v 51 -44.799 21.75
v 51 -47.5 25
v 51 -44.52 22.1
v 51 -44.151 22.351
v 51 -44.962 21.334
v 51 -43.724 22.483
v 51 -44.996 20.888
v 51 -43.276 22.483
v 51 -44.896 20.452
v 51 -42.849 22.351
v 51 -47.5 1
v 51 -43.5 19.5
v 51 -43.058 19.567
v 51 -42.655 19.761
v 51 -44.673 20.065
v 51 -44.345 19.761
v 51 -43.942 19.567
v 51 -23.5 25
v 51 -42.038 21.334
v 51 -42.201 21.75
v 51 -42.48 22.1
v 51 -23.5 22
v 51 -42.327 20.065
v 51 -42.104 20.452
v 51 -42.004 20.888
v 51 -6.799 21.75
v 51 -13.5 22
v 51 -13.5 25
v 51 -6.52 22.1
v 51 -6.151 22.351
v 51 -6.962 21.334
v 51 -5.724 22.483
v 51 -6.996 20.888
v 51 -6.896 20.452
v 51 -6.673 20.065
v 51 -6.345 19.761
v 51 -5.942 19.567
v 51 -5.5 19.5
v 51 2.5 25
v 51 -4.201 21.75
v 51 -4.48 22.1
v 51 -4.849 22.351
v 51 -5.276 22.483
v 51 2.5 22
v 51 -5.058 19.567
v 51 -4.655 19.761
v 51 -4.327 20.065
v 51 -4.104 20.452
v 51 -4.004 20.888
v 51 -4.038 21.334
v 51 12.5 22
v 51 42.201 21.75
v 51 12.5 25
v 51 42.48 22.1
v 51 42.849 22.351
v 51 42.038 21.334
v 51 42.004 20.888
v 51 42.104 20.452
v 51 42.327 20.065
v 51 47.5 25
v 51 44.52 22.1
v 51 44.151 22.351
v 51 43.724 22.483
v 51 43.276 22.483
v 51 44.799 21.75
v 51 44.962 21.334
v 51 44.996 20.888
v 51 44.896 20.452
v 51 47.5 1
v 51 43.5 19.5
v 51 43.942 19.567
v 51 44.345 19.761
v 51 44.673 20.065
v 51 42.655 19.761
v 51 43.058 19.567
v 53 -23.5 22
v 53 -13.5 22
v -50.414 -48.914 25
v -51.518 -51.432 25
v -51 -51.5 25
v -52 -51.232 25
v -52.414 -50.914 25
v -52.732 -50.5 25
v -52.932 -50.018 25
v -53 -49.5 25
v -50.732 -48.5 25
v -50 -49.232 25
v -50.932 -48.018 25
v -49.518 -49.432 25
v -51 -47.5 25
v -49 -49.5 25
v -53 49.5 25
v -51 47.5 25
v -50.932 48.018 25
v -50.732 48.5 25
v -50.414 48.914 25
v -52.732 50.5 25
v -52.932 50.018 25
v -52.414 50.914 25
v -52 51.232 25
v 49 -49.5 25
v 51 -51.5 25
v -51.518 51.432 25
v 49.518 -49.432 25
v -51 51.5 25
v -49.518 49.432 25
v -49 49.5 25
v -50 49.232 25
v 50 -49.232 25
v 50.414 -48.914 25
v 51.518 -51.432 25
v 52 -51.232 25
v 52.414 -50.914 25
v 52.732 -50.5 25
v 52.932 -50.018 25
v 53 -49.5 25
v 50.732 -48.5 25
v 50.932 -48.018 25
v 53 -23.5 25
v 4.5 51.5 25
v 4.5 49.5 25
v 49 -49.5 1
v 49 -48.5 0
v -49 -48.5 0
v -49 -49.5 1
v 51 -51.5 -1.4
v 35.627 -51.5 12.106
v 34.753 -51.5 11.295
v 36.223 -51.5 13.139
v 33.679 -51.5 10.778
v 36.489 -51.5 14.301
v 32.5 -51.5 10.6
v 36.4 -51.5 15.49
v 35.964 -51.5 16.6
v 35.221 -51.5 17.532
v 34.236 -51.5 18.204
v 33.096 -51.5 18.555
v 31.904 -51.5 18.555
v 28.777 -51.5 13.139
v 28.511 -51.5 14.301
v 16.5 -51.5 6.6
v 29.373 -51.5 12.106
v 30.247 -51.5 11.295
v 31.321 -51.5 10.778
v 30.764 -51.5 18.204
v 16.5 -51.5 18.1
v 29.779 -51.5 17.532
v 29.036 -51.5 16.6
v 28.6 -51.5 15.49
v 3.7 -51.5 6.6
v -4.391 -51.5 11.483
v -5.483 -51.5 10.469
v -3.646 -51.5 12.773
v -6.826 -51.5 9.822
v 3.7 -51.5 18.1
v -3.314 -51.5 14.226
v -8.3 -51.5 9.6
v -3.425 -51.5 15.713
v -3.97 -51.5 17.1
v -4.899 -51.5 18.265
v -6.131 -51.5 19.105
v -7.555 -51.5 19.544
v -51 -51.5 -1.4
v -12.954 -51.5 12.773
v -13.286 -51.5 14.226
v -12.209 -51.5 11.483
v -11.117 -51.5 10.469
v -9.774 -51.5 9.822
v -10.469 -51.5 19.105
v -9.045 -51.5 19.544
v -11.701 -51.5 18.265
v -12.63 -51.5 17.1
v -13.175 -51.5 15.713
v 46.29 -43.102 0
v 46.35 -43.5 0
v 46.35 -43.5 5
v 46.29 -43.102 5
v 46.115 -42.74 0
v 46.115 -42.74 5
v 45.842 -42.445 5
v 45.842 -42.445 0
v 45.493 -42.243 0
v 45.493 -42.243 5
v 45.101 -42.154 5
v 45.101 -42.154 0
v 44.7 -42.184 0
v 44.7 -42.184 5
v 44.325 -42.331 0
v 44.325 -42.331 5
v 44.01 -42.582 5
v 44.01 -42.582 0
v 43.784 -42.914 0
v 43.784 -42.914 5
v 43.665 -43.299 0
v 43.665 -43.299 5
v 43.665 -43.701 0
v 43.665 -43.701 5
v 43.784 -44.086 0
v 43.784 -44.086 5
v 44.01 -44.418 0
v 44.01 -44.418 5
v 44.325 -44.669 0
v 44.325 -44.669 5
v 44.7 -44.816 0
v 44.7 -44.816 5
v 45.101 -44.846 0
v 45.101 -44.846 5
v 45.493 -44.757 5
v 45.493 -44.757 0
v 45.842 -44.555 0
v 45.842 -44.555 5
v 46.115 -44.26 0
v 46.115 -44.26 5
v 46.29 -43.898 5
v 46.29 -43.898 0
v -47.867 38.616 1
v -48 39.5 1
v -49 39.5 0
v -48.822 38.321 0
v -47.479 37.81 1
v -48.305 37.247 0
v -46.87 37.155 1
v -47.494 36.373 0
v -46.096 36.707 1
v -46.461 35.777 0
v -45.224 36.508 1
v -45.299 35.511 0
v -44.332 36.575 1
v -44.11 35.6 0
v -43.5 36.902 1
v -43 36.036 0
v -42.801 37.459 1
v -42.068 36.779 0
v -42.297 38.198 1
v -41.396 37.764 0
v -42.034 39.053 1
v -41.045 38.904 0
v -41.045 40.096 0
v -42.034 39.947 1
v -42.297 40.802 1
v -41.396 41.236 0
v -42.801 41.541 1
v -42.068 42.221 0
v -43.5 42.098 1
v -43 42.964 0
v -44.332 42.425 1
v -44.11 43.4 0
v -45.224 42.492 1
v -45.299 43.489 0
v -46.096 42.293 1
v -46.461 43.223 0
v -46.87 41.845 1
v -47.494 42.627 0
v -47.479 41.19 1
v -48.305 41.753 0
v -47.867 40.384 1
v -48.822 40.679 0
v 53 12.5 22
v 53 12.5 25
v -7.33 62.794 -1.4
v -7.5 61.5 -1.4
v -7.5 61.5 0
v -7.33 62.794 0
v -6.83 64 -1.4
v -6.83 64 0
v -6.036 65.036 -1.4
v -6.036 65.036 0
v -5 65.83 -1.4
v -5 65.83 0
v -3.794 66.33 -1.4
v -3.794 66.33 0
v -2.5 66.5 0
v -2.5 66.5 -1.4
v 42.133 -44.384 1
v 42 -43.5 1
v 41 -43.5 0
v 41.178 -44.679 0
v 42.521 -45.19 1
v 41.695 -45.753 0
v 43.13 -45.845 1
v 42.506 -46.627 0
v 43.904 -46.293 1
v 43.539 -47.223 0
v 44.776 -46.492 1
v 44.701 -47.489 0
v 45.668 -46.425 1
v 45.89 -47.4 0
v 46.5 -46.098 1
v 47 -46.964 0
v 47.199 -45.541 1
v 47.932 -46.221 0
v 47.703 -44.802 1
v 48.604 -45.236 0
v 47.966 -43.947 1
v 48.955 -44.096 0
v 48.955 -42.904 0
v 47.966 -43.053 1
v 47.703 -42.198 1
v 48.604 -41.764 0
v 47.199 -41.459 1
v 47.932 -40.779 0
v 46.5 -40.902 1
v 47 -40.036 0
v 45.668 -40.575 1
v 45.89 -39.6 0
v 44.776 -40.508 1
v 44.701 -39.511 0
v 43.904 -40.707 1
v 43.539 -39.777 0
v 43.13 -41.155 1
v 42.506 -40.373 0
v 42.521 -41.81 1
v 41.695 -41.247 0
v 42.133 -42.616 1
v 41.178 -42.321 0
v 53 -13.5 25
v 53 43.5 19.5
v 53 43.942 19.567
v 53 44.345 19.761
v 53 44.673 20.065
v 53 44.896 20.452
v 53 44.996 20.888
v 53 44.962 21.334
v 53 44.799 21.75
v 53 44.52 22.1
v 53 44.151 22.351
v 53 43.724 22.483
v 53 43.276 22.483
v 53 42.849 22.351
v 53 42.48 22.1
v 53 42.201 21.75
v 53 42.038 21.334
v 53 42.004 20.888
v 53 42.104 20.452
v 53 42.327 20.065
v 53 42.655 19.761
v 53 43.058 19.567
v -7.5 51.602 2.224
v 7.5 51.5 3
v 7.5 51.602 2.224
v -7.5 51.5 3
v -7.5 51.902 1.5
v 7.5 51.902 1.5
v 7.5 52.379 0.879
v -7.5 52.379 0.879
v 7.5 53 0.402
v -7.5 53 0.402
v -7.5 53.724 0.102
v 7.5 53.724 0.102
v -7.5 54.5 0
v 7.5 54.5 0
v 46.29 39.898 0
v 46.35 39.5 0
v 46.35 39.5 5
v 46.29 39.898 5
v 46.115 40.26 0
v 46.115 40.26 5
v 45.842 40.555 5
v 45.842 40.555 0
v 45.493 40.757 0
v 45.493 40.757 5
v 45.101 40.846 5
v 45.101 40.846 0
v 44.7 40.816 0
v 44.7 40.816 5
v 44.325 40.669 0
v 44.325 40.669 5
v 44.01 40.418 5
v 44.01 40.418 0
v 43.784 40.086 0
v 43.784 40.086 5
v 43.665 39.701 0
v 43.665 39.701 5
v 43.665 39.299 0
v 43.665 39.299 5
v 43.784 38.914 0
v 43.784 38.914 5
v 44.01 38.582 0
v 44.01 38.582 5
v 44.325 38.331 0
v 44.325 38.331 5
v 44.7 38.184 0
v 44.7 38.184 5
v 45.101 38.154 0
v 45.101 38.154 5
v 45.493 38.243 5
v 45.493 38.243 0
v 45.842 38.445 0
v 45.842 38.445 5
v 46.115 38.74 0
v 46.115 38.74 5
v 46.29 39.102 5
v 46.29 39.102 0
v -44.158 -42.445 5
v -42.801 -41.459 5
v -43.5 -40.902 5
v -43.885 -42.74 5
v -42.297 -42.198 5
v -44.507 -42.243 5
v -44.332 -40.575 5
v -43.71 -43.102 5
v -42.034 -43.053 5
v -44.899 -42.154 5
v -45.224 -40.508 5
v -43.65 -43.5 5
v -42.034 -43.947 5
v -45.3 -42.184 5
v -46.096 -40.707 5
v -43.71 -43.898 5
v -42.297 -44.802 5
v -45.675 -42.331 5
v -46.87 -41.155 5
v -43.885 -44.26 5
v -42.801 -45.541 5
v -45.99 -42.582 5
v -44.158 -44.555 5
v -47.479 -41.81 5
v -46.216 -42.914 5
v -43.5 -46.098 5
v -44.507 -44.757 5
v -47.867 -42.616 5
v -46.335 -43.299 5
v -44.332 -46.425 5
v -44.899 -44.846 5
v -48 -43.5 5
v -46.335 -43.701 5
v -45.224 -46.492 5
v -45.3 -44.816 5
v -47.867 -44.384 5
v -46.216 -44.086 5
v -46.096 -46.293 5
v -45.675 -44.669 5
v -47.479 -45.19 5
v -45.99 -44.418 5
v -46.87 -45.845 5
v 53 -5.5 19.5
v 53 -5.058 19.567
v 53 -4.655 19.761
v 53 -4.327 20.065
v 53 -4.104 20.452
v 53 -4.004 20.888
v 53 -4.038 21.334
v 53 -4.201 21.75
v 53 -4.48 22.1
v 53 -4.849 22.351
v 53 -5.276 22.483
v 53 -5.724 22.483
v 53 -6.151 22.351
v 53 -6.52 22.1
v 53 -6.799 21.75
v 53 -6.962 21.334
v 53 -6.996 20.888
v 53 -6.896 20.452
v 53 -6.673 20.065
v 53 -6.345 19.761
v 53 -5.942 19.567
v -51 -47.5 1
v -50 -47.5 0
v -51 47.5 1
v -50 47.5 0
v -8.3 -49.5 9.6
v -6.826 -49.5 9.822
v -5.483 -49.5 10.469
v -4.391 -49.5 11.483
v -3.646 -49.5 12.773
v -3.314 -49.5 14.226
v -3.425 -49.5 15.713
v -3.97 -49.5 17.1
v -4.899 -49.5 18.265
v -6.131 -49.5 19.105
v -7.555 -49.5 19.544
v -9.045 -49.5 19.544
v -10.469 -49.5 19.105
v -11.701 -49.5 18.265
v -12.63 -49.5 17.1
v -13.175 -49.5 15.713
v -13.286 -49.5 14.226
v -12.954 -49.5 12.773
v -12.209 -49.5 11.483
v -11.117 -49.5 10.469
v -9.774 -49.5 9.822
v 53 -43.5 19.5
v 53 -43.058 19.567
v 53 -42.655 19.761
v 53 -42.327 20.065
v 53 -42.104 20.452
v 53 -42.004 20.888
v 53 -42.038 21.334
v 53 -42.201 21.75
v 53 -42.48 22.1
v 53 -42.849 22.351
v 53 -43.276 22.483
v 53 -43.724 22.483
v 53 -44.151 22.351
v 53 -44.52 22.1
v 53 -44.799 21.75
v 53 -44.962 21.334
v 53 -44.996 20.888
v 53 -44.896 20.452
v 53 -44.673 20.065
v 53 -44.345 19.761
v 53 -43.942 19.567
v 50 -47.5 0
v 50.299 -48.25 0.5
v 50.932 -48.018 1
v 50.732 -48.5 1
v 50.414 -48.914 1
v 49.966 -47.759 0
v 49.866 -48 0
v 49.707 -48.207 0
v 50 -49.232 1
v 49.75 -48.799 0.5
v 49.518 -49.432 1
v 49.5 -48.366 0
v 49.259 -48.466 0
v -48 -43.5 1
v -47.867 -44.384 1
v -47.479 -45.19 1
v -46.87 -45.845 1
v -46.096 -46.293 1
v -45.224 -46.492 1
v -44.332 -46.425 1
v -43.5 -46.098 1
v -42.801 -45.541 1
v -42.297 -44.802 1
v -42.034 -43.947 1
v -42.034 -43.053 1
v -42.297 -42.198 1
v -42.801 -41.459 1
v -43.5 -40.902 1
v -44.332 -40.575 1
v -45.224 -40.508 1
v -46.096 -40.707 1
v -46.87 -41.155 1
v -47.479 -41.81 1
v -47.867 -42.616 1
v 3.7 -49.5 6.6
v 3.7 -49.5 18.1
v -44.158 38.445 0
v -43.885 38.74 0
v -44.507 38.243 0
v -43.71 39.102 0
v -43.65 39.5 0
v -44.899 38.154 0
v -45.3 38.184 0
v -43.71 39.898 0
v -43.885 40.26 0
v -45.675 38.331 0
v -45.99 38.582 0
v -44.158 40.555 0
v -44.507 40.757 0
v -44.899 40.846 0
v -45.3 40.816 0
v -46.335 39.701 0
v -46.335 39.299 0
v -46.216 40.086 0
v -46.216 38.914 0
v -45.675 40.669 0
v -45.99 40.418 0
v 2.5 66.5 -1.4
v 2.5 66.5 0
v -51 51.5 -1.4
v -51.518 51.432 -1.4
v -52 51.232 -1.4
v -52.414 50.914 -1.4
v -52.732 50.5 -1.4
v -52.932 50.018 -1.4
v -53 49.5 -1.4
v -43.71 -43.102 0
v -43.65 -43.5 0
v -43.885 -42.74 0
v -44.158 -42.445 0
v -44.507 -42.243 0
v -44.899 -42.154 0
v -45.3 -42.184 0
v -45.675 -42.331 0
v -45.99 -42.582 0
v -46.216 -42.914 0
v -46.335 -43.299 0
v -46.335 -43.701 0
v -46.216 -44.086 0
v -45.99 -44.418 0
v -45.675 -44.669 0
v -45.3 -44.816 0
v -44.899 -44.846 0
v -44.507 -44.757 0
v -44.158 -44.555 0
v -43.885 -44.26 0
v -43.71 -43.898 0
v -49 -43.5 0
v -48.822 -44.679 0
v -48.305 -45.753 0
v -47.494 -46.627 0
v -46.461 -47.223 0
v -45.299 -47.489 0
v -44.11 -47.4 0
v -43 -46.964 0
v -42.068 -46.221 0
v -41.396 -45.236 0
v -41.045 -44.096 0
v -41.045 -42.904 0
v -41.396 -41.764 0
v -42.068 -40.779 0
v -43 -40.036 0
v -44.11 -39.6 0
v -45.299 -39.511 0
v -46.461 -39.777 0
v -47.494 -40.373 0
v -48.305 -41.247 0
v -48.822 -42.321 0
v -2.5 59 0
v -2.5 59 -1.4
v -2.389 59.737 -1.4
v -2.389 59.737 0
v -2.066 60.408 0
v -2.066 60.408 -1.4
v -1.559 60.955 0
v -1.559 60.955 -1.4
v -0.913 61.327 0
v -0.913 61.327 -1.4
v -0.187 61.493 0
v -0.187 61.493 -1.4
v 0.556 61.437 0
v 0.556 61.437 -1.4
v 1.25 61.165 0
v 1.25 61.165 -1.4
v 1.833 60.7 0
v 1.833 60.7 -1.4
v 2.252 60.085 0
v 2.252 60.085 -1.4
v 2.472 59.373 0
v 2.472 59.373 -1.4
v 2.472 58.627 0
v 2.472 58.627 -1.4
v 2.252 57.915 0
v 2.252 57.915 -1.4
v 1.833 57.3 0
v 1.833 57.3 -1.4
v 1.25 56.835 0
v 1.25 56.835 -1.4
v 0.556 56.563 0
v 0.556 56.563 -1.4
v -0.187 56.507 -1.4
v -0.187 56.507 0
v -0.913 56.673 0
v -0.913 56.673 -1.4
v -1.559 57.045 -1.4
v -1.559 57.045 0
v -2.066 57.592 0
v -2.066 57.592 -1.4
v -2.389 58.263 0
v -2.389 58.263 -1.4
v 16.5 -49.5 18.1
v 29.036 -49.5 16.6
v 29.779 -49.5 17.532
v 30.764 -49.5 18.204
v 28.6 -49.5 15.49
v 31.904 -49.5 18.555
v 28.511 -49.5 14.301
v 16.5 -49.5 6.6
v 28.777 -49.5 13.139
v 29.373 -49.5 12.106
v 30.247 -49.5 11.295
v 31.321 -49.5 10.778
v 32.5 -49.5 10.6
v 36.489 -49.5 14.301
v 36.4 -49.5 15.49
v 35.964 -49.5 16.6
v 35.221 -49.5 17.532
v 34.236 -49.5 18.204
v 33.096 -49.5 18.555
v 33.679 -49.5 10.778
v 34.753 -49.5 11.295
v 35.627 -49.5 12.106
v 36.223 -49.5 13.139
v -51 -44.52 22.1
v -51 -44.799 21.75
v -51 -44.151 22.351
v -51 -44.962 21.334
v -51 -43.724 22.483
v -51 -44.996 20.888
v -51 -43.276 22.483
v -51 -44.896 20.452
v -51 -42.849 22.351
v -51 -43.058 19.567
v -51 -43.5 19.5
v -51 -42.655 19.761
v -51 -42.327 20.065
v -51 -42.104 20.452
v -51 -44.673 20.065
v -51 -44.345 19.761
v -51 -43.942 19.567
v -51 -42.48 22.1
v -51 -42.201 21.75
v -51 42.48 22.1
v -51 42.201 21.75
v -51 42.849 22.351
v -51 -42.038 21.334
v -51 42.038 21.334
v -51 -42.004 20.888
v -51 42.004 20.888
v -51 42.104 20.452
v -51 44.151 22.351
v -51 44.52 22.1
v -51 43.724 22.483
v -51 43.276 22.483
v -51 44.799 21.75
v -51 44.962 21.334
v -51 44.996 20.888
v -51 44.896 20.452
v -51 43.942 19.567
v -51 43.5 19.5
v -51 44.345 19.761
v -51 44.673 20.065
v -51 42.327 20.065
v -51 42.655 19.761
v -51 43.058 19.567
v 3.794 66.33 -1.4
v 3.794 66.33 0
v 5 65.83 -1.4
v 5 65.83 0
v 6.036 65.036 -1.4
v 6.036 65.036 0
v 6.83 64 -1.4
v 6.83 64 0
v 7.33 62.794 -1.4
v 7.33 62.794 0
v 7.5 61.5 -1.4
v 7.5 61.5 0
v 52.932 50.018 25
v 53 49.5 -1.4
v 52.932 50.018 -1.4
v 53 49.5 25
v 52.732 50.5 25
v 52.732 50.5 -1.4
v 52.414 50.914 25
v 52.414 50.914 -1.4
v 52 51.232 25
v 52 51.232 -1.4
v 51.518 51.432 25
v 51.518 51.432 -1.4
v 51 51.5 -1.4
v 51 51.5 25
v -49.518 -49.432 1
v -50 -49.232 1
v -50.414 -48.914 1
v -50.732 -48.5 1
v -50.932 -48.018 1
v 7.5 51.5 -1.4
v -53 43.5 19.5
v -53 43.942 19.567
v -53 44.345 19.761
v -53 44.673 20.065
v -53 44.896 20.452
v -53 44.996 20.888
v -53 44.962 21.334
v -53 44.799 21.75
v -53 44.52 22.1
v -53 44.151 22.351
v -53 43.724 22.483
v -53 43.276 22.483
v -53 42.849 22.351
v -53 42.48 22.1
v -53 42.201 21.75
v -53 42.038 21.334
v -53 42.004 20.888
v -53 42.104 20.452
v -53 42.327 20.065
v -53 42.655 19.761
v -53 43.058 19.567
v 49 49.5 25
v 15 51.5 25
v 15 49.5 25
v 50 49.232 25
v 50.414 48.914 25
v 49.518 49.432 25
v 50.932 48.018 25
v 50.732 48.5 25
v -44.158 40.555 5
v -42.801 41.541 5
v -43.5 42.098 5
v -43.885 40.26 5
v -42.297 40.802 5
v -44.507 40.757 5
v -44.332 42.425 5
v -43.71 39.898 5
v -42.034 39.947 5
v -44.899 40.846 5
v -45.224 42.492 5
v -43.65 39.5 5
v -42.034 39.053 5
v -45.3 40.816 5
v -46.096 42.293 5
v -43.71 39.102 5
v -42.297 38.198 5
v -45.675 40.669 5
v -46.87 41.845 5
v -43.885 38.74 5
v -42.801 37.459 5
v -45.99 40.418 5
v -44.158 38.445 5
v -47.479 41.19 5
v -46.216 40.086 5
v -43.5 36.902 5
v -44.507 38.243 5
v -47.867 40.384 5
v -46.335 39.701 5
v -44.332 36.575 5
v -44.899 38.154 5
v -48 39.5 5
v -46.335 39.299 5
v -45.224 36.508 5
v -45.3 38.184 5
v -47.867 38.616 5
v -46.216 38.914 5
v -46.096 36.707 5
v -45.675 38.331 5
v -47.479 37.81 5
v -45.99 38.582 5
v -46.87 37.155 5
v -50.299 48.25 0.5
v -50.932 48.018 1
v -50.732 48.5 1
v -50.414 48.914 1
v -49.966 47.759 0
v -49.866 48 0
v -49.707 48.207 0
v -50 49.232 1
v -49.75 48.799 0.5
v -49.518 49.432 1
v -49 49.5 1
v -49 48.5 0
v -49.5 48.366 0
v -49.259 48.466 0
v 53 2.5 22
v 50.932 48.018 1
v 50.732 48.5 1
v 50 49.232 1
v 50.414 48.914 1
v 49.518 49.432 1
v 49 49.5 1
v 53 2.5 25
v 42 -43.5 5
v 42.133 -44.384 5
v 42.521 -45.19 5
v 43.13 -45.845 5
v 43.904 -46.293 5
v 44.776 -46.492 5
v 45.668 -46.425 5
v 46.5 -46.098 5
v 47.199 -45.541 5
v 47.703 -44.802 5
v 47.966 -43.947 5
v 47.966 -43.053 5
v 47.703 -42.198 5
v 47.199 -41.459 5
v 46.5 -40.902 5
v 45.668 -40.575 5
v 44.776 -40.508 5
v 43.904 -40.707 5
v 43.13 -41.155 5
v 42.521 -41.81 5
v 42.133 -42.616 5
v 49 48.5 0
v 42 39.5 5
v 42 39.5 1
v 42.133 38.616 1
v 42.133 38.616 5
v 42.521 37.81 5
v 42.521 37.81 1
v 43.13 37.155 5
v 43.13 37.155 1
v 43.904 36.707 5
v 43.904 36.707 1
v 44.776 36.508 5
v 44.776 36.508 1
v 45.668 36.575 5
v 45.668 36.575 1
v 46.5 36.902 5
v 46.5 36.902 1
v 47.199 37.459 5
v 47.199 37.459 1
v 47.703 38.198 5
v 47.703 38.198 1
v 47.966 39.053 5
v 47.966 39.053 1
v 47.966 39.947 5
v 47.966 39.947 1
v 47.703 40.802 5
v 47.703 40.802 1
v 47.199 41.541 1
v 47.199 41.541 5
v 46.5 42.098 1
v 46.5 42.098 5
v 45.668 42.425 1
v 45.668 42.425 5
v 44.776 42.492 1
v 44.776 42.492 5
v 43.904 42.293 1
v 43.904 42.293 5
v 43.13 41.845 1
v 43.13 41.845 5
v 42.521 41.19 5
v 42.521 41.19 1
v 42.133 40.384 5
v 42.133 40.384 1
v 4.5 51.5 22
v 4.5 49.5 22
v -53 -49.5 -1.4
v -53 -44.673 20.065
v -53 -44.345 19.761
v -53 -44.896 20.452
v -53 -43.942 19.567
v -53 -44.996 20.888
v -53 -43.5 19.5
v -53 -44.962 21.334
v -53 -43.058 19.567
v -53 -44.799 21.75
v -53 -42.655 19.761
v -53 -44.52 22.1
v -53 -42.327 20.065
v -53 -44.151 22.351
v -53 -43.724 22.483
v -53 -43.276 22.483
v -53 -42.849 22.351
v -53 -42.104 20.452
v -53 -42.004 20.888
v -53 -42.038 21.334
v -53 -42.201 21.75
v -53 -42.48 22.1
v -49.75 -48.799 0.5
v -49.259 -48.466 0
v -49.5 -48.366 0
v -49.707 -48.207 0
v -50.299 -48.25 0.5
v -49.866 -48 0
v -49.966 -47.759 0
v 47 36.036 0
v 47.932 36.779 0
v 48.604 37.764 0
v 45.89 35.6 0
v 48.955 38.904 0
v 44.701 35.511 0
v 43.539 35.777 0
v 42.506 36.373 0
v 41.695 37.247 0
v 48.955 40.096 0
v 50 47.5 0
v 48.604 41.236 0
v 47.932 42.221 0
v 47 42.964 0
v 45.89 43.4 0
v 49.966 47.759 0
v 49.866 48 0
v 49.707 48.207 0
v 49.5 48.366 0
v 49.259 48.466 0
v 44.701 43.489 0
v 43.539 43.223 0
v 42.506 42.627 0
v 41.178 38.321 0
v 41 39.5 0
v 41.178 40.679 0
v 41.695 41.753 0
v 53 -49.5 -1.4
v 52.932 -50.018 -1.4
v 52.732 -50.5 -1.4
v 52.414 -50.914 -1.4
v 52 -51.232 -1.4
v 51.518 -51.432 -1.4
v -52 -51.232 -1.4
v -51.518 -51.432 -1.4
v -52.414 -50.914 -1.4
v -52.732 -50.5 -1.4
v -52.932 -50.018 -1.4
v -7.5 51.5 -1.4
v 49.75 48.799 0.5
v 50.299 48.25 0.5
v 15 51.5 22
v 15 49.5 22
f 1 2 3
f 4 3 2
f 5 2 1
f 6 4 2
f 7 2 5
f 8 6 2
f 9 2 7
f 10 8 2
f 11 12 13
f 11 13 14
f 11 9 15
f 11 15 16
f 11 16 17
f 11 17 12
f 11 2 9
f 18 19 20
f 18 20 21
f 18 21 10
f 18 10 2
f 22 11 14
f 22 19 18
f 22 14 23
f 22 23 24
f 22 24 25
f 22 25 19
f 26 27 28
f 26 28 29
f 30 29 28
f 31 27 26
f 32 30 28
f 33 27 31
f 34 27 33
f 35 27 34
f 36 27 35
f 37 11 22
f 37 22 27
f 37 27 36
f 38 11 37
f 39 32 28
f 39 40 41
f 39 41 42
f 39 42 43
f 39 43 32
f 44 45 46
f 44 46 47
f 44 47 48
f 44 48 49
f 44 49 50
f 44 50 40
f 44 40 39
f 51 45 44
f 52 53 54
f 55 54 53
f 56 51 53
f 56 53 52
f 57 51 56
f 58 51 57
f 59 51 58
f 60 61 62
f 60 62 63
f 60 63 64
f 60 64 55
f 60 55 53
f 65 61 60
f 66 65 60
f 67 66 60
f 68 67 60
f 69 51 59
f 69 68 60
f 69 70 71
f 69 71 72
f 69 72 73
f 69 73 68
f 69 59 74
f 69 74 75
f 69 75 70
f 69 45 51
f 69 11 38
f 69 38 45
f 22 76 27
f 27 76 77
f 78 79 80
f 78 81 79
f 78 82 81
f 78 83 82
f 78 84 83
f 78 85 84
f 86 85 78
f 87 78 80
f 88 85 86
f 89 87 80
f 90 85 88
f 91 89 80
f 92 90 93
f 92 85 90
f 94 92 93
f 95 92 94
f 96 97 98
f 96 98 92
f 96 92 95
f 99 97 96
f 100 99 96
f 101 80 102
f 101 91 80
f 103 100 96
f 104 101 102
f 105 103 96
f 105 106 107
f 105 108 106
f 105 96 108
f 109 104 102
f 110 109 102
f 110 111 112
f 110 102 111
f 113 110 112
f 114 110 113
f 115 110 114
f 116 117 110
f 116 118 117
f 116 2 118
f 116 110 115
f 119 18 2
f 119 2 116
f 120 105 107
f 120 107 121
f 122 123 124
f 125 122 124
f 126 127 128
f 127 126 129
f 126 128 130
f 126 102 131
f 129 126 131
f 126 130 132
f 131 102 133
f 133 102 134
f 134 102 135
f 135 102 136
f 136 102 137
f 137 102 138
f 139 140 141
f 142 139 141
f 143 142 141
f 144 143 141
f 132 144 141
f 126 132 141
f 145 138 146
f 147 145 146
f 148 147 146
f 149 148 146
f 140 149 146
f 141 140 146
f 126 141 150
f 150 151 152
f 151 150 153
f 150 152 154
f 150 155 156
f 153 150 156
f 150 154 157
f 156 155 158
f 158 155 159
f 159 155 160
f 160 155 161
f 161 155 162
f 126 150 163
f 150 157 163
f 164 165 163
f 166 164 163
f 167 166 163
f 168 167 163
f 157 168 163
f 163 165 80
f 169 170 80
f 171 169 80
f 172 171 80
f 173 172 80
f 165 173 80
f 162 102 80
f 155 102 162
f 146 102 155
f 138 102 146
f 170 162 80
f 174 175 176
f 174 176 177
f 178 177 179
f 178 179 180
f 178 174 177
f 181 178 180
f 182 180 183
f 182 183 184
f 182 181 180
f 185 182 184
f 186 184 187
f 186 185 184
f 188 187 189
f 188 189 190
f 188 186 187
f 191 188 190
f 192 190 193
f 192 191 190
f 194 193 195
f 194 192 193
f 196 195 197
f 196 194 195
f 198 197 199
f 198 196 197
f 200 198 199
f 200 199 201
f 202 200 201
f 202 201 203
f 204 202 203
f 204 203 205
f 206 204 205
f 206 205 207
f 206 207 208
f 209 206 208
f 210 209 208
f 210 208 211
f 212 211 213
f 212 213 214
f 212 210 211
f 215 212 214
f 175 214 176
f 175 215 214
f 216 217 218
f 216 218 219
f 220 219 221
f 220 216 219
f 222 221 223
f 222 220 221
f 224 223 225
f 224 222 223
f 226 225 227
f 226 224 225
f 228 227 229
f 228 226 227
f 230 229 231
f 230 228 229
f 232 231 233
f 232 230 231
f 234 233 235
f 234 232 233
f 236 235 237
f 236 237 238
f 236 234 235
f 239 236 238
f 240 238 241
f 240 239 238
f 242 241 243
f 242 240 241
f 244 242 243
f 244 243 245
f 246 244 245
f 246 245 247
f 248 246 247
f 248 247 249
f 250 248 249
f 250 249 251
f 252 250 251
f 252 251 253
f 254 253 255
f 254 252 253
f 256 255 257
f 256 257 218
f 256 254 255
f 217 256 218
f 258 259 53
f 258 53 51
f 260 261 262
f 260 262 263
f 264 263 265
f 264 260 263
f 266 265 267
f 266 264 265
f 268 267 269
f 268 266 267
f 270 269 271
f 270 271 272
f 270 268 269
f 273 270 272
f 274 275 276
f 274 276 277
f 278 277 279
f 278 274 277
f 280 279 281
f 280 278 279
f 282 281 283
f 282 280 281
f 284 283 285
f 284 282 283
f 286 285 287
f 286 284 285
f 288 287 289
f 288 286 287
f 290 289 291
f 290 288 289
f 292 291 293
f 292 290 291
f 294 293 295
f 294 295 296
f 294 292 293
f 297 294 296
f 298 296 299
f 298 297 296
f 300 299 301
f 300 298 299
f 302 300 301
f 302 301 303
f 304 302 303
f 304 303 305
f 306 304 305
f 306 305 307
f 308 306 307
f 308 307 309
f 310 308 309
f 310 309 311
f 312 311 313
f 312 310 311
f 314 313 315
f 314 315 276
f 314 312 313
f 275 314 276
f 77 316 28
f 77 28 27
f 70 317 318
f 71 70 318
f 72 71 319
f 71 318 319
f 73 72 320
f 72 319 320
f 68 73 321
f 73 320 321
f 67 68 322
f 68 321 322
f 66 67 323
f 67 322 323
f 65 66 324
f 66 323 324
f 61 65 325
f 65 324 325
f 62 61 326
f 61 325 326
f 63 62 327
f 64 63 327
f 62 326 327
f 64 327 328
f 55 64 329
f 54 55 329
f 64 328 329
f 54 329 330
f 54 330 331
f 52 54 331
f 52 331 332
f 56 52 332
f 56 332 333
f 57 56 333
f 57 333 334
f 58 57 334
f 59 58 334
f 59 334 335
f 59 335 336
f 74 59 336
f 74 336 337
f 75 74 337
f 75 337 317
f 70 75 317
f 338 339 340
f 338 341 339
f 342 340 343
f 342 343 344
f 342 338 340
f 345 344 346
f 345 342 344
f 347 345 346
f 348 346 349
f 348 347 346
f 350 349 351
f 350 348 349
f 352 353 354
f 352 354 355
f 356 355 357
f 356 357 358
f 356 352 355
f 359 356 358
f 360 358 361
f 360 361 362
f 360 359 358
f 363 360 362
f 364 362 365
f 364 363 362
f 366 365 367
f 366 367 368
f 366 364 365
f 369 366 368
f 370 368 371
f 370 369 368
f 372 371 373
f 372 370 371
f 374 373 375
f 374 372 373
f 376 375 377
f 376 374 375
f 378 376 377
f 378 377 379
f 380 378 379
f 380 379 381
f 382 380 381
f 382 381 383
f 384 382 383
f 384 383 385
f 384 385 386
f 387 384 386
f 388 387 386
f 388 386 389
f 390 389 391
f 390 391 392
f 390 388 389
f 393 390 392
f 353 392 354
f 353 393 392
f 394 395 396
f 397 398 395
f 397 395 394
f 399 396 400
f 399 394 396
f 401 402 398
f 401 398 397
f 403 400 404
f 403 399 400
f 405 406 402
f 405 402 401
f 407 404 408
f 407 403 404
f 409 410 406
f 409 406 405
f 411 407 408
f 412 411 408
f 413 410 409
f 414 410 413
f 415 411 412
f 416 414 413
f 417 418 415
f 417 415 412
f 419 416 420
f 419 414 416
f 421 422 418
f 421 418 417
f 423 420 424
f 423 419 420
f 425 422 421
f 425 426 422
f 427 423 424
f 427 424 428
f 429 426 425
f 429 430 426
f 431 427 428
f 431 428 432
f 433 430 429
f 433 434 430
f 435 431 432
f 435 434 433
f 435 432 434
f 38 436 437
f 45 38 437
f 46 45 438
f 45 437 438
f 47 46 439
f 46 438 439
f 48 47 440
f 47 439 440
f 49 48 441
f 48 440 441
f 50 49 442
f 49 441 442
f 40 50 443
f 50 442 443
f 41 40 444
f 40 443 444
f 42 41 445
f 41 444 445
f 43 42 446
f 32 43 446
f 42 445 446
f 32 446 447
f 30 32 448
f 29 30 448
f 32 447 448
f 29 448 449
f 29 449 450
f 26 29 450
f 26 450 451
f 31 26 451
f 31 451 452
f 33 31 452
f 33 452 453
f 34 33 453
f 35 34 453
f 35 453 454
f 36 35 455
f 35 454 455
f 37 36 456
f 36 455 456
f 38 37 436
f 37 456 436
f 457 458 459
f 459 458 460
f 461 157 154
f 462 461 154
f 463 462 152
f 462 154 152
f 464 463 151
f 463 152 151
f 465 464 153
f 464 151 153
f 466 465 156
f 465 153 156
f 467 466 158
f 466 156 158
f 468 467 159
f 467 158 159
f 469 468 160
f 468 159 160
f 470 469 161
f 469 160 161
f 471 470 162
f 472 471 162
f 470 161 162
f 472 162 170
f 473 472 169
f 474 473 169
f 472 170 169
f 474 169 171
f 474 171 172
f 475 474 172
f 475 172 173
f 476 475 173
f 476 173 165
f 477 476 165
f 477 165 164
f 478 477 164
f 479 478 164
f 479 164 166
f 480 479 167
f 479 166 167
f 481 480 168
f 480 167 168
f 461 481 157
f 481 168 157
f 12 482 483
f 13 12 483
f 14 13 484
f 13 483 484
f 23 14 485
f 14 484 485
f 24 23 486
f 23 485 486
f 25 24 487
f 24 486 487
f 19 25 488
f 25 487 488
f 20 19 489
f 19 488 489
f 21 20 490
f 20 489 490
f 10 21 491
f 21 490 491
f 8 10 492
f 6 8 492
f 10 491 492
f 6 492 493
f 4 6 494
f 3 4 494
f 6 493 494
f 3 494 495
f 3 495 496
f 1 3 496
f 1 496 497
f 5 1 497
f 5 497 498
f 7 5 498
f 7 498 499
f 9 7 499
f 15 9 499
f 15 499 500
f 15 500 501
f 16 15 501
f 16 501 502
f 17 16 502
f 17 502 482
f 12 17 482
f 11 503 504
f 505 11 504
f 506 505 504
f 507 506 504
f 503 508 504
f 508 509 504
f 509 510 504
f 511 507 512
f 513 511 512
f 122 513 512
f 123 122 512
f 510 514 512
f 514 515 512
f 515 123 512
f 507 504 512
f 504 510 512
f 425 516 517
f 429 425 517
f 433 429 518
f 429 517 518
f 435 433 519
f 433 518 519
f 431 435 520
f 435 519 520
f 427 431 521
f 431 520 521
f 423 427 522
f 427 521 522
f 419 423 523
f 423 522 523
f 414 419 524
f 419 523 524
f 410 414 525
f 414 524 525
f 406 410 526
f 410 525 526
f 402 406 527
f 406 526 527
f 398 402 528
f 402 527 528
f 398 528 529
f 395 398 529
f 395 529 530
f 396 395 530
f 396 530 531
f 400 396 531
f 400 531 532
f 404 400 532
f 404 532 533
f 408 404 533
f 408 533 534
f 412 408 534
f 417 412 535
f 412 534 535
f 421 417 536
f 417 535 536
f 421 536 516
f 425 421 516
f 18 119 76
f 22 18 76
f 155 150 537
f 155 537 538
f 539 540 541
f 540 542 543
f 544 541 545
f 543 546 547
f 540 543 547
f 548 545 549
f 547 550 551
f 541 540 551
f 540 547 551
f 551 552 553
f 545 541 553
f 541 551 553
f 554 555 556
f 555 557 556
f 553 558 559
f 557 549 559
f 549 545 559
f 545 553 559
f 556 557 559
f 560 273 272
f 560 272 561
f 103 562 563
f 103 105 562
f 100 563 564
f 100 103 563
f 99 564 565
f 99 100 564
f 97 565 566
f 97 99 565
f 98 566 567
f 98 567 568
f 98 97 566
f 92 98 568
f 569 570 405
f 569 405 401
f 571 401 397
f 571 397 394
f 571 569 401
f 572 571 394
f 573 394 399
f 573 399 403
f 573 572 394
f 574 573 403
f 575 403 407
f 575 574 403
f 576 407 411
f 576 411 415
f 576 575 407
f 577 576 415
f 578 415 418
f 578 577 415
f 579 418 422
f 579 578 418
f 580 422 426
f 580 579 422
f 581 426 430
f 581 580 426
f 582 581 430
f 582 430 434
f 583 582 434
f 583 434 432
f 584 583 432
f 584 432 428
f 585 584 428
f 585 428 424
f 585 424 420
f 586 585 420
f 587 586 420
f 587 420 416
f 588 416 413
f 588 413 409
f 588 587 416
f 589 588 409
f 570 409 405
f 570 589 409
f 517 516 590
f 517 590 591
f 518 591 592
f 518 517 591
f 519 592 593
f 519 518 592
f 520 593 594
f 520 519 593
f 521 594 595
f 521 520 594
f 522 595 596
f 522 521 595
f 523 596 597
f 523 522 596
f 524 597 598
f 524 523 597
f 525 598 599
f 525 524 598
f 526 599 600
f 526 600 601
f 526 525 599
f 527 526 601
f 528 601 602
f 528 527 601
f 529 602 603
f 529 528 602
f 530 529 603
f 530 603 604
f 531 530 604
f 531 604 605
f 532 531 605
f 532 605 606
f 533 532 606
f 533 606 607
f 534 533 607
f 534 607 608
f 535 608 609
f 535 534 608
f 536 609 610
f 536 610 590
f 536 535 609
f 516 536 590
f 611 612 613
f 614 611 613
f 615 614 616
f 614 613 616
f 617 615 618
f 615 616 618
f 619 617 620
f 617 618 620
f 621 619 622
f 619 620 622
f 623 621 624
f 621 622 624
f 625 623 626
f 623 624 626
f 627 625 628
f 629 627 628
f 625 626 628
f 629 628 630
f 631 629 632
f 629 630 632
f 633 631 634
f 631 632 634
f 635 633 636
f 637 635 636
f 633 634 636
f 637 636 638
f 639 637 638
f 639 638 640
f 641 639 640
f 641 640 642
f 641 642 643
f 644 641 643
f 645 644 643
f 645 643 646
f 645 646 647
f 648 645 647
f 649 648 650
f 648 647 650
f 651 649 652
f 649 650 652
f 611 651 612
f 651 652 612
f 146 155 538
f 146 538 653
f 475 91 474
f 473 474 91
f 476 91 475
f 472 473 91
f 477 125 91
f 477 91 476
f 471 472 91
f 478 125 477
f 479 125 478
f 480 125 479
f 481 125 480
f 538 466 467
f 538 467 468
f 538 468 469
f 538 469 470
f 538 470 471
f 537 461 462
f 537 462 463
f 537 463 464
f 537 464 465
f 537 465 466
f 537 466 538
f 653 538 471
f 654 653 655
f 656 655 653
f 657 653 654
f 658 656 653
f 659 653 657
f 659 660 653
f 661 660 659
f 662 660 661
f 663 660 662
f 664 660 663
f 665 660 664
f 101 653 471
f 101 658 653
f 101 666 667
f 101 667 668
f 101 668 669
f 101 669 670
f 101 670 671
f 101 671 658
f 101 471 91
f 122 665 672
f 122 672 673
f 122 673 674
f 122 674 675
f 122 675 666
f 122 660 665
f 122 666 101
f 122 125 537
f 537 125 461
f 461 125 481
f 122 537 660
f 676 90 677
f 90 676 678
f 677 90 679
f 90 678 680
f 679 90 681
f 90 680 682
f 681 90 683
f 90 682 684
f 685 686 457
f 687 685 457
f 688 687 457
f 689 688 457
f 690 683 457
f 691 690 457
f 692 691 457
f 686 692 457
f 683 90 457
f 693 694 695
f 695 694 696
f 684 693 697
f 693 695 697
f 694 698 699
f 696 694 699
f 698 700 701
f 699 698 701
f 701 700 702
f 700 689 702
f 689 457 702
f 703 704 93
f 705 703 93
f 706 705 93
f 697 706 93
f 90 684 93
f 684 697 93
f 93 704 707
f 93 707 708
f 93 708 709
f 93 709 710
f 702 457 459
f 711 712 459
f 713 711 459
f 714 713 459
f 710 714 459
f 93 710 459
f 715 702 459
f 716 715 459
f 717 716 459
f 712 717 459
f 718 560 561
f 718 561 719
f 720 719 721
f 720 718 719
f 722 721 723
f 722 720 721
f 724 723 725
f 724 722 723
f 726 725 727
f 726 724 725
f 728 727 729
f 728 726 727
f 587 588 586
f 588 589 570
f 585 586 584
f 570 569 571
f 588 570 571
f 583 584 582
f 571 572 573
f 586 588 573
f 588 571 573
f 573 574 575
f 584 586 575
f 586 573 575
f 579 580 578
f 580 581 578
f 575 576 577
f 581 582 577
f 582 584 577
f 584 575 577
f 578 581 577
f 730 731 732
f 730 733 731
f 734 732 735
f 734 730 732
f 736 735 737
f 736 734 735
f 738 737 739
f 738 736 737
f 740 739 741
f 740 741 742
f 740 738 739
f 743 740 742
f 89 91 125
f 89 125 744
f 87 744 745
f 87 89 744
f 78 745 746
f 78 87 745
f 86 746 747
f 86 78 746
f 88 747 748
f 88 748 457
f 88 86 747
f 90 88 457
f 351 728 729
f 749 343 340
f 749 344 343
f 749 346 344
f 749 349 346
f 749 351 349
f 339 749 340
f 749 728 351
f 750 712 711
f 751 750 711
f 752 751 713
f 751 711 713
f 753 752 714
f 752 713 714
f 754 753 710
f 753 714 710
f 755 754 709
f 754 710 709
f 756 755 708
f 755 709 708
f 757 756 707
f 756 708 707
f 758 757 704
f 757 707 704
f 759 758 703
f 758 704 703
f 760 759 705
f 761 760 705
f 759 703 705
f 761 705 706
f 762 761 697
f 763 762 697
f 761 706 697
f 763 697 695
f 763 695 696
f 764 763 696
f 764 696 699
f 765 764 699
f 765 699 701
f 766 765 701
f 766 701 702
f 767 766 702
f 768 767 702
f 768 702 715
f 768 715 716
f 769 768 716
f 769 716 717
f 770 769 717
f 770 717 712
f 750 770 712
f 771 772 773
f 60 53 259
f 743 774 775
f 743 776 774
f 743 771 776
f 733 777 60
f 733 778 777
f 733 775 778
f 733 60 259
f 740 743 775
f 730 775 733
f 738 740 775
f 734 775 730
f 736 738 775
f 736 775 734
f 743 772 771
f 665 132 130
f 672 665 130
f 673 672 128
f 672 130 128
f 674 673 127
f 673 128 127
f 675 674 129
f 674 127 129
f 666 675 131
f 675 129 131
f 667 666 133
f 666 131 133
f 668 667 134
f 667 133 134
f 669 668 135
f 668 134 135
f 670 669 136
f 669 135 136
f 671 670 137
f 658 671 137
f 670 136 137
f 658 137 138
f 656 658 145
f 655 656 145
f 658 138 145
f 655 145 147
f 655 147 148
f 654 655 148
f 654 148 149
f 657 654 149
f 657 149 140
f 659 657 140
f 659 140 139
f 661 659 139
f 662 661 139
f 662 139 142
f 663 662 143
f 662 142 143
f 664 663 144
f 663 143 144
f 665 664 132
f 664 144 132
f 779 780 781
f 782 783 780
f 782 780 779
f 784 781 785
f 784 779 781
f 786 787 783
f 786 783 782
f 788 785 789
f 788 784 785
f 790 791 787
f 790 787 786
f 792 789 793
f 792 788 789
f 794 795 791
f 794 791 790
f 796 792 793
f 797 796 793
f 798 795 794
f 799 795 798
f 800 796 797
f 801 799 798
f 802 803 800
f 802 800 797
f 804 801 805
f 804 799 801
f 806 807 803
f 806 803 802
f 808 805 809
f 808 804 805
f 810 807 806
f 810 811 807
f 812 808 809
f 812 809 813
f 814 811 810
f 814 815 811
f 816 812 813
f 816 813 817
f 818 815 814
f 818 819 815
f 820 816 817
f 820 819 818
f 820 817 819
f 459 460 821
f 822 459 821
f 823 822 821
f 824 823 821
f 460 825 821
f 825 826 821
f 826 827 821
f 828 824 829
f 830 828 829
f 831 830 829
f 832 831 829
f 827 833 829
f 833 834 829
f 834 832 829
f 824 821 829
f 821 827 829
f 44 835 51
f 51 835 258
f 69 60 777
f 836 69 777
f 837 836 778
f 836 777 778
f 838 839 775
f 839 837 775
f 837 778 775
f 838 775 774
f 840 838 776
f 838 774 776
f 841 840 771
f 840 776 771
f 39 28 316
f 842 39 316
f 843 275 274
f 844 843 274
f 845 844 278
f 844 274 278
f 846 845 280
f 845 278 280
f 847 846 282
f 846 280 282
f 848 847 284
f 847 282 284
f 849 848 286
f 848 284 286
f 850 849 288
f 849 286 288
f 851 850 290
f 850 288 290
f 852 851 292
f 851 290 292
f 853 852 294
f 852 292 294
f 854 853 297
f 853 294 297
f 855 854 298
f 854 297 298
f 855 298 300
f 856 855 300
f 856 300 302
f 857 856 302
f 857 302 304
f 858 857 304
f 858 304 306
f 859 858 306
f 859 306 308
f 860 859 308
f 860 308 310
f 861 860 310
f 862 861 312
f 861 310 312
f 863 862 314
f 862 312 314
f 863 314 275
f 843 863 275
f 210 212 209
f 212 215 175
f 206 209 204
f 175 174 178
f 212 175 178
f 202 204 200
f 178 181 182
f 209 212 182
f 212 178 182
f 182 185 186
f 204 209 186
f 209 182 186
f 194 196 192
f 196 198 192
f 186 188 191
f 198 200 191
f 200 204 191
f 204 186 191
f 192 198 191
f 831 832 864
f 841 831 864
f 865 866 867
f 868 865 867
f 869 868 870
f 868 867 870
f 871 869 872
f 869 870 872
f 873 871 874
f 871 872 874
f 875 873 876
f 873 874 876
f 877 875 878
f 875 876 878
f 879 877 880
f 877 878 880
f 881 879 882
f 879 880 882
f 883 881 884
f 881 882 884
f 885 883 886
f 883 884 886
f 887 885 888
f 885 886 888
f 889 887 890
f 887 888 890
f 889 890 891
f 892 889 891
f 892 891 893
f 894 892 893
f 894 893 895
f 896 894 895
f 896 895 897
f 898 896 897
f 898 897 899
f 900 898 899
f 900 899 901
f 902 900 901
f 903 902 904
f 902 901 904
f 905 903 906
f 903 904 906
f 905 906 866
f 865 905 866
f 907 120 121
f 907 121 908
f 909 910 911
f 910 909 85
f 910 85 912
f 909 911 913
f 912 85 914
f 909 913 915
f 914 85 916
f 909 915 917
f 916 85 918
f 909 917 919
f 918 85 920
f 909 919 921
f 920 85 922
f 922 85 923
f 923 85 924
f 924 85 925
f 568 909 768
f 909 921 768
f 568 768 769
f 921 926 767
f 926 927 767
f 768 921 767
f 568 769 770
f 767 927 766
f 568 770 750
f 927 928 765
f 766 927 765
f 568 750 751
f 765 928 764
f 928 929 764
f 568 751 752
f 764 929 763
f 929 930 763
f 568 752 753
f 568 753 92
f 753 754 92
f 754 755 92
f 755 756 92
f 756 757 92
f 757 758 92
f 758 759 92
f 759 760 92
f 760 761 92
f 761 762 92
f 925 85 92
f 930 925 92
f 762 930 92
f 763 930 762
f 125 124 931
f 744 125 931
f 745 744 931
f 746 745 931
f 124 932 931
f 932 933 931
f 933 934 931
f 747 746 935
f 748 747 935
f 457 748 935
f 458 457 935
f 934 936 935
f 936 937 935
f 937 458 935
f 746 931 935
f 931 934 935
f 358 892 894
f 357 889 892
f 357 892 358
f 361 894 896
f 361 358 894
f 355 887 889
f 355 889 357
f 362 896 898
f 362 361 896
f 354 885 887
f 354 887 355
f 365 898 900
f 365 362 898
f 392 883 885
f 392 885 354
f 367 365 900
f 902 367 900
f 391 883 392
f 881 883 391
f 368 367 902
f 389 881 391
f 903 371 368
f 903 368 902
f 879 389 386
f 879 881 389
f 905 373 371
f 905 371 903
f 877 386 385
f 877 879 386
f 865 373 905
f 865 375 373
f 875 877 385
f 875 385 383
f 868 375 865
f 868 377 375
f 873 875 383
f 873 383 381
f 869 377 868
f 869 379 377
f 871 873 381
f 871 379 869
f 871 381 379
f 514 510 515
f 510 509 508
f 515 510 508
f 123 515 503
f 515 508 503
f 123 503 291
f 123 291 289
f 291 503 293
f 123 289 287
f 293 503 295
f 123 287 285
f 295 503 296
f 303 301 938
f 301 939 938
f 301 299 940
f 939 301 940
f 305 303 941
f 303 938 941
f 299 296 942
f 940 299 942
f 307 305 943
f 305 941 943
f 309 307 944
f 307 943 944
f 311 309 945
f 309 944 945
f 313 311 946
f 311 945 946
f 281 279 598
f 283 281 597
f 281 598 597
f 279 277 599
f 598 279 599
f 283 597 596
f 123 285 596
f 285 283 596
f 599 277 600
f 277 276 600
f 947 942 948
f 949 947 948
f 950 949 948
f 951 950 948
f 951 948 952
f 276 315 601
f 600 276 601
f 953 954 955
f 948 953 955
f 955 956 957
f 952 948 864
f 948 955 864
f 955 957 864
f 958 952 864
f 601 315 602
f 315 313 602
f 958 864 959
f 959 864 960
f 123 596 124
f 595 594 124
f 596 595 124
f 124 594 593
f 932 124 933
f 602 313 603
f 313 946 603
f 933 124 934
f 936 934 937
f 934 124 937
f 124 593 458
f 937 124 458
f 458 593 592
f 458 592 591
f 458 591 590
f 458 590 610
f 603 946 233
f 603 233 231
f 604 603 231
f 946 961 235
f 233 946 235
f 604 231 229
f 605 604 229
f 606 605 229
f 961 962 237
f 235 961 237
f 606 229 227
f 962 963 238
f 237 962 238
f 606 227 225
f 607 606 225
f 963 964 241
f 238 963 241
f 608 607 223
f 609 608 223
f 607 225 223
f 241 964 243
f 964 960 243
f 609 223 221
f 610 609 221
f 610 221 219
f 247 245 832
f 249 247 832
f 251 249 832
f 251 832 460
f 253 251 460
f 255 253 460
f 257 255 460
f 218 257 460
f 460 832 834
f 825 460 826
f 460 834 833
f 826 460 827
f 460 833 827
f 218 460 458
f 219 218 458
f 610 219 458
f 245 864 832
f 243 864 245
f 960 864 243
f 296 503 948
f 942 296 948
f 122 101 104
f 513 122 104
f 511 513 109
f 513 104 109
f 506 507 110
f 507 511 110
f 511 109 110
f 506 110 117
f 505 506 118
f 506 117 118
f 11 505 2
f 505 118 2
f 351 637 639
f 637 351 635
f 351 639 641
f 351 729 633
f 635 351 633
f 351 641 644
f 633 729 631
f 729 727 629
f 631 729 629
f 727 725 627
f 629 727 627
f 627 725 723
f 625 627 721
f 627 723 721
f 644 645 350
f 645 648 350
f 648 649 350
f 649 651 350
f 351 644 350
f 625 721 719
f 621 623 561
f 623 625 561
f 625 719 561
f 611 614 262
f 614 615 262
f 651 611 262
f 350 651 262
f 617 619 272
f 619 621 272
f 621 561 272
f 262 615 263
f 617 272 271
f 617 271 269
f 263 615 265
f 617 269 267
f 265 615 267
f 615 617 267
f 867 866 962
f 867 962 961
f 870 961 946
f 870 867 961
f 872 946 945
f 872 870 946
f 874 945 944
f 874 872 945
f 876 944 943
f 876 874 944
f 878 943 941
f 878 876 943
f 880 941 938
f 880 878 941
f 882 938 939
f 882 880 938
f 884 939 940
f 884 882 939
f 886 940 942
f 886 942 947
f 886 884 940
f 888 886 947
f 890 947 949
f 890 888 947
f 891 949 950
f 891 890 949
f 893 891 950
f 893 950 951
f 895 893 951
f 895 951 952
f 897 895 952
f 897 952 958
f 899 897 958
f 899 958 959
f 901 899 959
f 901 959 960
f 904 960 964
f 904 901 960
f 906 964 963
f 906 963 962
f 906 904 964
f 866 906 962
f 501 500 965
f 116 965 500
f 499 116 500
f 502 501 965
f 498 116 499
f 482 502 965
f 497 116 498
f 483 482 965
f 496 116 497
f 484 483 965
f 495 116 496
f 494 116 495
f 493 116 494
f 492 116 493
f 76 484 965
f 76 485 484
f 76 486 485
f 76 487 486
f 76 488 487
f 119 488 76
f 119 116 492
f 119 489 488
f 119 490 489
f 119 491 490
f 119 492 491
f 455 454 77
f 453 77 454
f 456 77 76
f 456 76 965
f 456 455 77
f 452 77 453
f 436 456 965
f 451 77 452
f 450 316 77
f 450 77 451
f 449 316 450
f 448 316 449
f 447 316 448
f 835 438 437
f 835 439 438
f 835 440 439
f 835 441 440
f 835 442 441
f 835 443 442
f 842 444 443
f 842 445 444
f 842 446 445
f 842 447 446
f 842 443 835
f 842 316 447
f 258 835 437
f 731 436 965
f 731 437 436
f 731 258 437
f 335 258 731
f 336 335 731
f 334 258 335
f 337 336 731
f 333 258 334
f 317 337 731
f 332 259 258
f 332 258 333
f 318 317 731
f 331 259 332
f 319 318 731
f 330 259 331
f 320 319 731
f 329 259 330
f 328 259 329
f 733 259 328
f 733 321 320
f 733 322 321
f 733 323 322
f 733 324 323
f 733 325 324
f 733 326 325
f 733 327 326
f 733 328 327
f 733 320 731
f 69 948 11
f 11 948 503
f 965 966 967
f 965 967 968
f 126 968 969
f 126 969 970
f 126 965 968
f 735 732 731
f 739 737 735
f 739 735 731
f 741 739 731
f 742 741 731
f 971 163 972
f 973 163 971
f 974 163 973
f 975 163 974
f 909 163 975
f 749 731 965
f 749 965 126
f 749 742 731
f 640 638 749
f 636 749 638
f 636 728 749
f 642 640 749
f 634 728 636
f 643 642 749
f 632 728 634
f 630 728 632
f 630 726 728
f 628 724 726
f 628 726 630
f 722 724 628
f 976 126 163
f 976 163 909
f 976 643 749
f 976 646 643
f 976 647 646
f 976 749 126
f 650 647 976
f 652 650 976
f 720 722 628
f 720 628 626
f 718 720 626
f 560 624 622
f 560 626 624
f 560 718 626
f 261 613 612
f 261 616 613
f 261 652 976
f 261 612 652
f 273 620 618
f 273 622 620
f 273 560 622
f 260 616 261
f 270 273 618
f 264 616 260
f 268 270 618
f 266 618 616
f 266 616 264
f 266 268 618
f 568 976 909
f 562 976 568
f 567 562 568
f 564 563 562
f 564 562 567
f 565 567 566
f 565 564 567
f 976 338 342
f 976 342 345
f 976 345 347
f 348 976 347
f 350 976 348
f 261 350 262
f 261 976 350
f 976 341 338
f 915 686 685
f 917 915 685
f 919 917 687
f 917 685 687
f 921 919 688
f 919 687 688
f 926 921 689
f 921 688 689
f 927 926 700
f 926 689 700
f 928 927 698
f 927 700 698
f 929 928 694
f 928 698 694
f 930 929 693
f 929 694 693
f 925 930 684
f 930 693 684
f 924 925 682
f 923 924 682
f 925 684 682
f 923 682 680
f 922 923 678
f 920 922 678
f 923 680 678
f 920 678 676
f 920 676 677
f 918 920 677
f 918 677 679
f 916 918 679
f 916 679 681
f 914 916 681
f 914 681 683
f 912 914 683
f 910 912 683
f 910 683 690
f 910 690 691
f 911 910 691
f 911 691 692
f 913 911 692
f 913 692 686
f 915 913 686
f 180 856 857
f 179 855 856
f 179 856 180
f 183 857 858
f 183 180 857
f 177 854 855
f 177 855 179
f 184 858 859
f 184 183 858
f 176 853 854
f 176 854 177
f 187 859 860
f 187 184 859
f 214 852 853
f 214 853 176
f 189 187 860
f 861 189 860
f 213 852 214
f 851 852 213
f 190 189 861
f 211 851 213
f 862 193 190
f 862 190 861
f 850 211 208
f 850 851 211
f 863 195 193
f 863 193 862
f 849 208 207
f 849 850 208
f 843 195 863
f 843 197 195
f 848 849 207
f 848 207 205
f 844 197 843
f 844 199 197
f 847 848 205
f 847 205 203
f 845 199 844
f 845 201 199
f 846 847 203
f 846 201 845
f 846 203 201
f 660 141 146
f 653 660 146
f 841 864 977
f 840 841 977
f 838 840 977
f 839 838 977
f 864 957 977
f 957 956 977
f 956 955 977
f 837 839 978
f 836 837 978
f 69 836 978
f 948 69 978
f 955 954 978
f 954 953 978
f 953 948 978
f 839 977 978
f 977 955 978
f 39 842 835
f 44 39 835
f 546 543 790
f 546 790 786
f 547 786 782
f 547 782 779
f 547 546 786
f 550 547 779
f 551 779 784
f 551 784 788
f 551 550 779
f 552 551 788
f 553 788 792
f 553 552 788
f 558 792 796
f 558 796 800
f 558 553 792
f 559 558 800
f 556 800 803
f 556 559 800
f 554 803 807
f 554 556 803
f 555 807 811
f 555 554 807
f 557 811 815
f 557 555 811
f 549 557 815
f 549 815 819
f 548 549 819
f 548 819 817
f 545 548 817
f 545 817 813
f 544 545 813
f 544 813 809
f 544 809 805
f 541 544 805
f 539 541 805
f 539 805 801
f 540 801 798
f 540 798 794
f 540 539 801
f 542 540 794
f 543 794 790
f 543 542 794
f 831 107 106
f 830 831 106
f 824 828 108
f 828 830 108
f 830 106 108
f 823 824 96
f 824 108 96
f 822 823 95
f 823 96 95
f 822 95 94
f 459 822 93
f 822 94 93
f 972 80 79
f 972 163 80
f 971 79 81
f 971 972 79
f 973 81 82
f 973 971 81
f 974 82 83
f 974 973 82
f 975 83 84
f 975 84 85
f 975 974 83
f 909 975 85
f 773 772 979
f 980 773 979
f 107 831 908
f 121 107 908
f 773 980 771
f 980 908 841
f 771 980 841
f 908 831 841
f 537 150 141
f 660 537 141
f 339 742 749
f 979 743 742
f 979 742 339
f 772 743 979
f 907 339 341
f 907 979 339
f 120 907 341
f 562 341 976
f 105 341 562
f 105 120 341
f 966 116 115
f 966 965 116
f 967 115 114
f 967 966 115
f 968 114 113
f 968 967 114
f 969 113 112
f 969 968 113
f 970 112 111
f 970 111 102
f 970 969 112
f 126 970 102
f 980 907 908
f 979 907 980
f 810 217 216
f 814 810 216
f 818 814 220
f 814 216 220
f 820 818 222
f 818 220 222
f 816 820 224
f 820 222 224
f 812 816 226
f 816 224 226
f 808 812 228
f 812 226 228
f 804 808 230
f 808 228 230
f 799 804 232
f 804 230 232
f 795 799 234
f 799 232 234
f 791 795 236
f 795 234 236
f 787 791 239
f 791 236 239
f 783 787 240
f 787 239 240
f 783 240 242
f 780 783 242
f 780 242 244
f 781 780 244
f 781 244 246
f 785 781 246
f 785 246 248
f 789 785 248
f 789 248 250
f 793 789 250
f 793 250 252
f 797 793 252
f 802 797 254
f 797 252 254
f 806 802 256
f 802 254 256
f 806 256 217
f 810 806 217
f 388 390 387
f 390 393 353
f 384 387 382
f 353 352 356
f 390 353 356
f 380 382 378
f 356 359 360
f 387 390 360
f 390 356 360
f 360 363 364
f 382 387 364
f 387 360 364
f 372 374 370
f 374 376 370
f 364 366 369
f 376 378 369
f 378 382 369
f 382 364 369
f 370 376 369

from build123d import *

# Parameters (mm, degrees)
SKETCH_1_W          = 106
SKETCH_1_H          = 103
SKETCH_1_W_2        = 102
SKETCH_1_H_2        = 99
EXTRUDE_1_DEPTH     = 25
SKETCH_2_W          = 106
SKETCH_2_H          = 103
EXTRUDE_2_DEPTH     = 1.4
SKETCH_3_R          = 3
SKETCH_3_R_2        = 1.35
EXTRUDE_3_DEPTH     = 5
SKETCH_4_W          = 12.8
SKETCH_4_H          = 11.5
CUT_EXTRUDE_1_DEPTH = 101
FILLET_1_R          = 2
CHAMFER_1_SIZE      = 1
SKETCH_5_R          = 4
SKETCH_5_R_2        = 5
CUT_EXTRUDE_2_DEPTH = 2
SKETCH_6_W          = 3
SKETCH_6_H          = 10
CUT_EXTRUDE_3_DEPTH = 2
SKETCH_8_R          = 1.5
CUT_EXTRUDE_4_DEPTH = 121.470950855
SKETCH_9_R          = 1.5
CUT_EXTRUDE_5_DEPTH = 2
SKETCH_10_W         = 10.5
SKETCH_10_H         = 3
CUT_EXTRUDE_6_DEPTH = 2
SKETCH_11_R         = 2.5
EXTRUDE_4_DEPTH     = 1.4
FILLET_2_R          = 3


with BuildPart() as part:
    # Эскиз1 → Бобышка-Вытянуть1 (new body)
    with BuildSketch(Plane.XY):
        Rectangle(SKETCH_1_W, SKETCH_1_H)
        Rectangle(SKETCH_1_W_2, SKETCH_1_H_2, mode=Mode.SUBTRACT)
    extrude(amount=EXTRUDE_1_DEPTH)

    # Эскиз2 → Бобышка-Вытянуть2 (add)
    with BuildSketch(Plane(origin=(0, 0, 0), x_dir=(-1, 0, 0), z_dir=(0, 0, -1))):
        Rectangle(SKETCH_2_W, SKETCH_2_H)
    extrude(amount=EXTRUDE_2_DEPTH)

    # Эскиз3 → Бобышка-Вытянуть3 (add)
    # profile 1 of 4: a face of its own
    with BuildSketch(Plane.XY):
        with Locations(Location((-45, 39.5, 0), (0, 0, 180))):
            Circle(SKETCH_3_R)
        with Locations((-45, 39.5)):
            Circle(SKETCH_3_R_2, mode=Mode.SUBTRACT)
    # profile 2 of 4: a face of its own
    with BuildSketch(Plane.XY):
        with Locations(Location((45, 39.5, 0), (0, 0, 180))):
            Circle(SKETCH_3_R)
        with Locations((45, 39.5)):
            Circle(SKETCH_3_R_2, mode=Mode.SUBTRACT)
    # profile 3 of 4: a face of its own
    with BuildSketch(Plane.XY):
        with Locations(Location((-45, -43.5, 0), (0, 0, 180))):
            Circle(SKETCH_3_R)
        with Locations((-45, -43.5)):
            Circle(SKETCH_3_R_2, mode=Mode.SUBTRACT)
    # profile 4 of 4: a face of its own
    with BuildSketch(Plane.XY):
        with Locations(Location((45, -43.5, 0), (0, 0, 180))):
            Circle(SKETCH_3_R)
        with Locations((45, -43.5)):
            Circle(SKETCH_3_R_2, mode=Mode.SUBTRACT)
    extrude(amount=EXTRUDE_3_DEPTH)

    # Эскиз4 → Вырез-Вытянуть1 (cut)
    with BuildSketch(Plane.XZ.offset(51.5)):
        with Locations((10.1, 12.35)):
            Rectangle(SKETCH_4_W, SKETCH_4_H)
    extrude(amount=-CUT_EXTRUDE_1_DEPTH, mode=Mode.SUBTRACT)

    # Скругление1
    fillet_1_edges = [part.edges().sort_by_distance(p)[0] for p in [
        (51, -49.5, 12.5),
        (51, 49.5, 12.5),
        (-51, 49.5, 12.5),
        (-51, -49.5, 12.5),
        (53, -51.5, 11.8),
        (-53, -51.5, 11.8),
        (-53, 51.5, 11.8),
        (53, 51.5, 11.8),
    ]]
    fillet(fillet_1_edges, radius=FILLET_1_R)

    # Фаска1
    chamfer_1_edges = [part.edges().sort_by_distance(p)[0] for p in [
        (-51, 0, 0),
        (0, -49.5, 0),
        (51, 0, 0),
        (0, 49.5, 0),
        (50.414213562, -48.914213562, 0),
        (50.414213562, 48.914213562, 0),
        (-50.414213562, 48.914213562, 0),
        (-50.414213562, -48.914213562, 0),
        (-42, 39.5, 0),
        (48, 39.5, 0),
        (-42, -43.5, 0),
        (48, -43.5, 0),
    ]]
    chamfer(chamfer_1_edges, length=CHAMFER_1_SIZE)

    # Эскиз5 → Вырез-Вытянуть2 (cut)
    with BuildSketch(Plane.XZ.offset(51.5)):
        with Locations(Location((32.5, 14.6, 0), (0, 0, 270))):
            Circle(SKETCH_5_R)
        with Locations(Location((-8.3, 14.6, 0), (0, 0, 270))):
            Circle(SKETCH_5_R_2)
    extrude(amount=-CUT_EXTRUDE_2_DEPTH, mode=Mode.SUBTRACT)

    # Эскиз6 → Вырез-Вытянуть3 (cut)
    with BuildSketch(Plane(origin=(53, 0, 0), x_dir=(0, 0, -1), z_dir=(1, 0, 0))):
        with Locations((-23.5, -18.5)):
            Rectangle(SKETCH_6_W, SKETCH_6_H)
        with Locations((-23.5, 7.5)):
            Rectangle(SKETCH_6_W, SKETCH_6_H)
    extrude(amount=-CUT_EXTRUDE_3_DEPTH, mode=Mode.SUBTRACT)

    # Эскиз8 → Вырез-Вытянуть4 (cut, through all)
    with BuildSketch(Plane(origin=(53, 0, 0), x_dir=(0, 0, -1), z_dir=(1, 0, 0))):
        with Locations((-21, 43.5)):
            Circle(SKETCH_8_R)
        with Locations((-21, -43.5)):
            Circle(SKETCH_8_R)
    extrude(amount=-CUT_EXTRUDE_4_DEPTH, mode=Mode.SUBTRACT)

    # Эскиз9 → Вырез-Вытянуть5 (cut)
    with BuildSketch(Plane(origin=(53, 0, 0), x_dir=(0, 0, -1), z_dir=(1, 0, 0))):
        with Locations((-21, -5.5)):
            Circle(SKETCH_9_R)
    extrude(amount=-CUT_EXTRUDE_5_DEPTH, mode=Mode.SUBTRACT)

    # Эскиз10 → Вырез-Вытянуть6 (cut)
    with BuildSketch(Plane(origin=(0, 51.5, 0), x_dir=(1, 0, 0), z_dir=(0, 1, 0))):
        with Locations((9.75, -23.5)):
            Rectangle(SKETCH_10_W, SKETCH_10_H)
    extrude(amount=-CUT_EXTRUDE_6_DEPTH, mode=Mode.SUBTRACT)

    # Эскиз11 → Бобышка-Вытянуть4 (add)
    with BuildSketch(Plane(origin=(0, 0, -1.4), x_dir=(-1, 0, 0), z_dir=(0, 0, -1))):
        with BuildLine():
            Line((-7.5, 51.5), (7.5, 51.5))
            Line((7.5, 51.5), (7.5, 61.5))
            ThreePointArc((7.5, 61.5), (6.035533906, 65.035533906), (2.5, 66.5))
            Line((2.5, 66.5), (-2.5, 66.5))
            ThreePointArc((-2.5, 66.5), (-6.035533906, 65.035533906), (-7.5, 61.5))
            Line((-7.5, 61.5), (-7.5, 51.5))
        make_face()
        with Locations((0, 59)):
            Circle(SKETCH_11_R, mode=Mode.SUBTRACT)
    extrude(amount=-EXTRUDE_4_DEPTH)

    # Скругление2
    fillet_2_edges = [part.edges().sort_by_distance(p)[0] for p in [
        (0, 51.5, 0),
    ]]
    fillet(fillet_2_edges, radius=FILLET_2_R)


solid = part.part
